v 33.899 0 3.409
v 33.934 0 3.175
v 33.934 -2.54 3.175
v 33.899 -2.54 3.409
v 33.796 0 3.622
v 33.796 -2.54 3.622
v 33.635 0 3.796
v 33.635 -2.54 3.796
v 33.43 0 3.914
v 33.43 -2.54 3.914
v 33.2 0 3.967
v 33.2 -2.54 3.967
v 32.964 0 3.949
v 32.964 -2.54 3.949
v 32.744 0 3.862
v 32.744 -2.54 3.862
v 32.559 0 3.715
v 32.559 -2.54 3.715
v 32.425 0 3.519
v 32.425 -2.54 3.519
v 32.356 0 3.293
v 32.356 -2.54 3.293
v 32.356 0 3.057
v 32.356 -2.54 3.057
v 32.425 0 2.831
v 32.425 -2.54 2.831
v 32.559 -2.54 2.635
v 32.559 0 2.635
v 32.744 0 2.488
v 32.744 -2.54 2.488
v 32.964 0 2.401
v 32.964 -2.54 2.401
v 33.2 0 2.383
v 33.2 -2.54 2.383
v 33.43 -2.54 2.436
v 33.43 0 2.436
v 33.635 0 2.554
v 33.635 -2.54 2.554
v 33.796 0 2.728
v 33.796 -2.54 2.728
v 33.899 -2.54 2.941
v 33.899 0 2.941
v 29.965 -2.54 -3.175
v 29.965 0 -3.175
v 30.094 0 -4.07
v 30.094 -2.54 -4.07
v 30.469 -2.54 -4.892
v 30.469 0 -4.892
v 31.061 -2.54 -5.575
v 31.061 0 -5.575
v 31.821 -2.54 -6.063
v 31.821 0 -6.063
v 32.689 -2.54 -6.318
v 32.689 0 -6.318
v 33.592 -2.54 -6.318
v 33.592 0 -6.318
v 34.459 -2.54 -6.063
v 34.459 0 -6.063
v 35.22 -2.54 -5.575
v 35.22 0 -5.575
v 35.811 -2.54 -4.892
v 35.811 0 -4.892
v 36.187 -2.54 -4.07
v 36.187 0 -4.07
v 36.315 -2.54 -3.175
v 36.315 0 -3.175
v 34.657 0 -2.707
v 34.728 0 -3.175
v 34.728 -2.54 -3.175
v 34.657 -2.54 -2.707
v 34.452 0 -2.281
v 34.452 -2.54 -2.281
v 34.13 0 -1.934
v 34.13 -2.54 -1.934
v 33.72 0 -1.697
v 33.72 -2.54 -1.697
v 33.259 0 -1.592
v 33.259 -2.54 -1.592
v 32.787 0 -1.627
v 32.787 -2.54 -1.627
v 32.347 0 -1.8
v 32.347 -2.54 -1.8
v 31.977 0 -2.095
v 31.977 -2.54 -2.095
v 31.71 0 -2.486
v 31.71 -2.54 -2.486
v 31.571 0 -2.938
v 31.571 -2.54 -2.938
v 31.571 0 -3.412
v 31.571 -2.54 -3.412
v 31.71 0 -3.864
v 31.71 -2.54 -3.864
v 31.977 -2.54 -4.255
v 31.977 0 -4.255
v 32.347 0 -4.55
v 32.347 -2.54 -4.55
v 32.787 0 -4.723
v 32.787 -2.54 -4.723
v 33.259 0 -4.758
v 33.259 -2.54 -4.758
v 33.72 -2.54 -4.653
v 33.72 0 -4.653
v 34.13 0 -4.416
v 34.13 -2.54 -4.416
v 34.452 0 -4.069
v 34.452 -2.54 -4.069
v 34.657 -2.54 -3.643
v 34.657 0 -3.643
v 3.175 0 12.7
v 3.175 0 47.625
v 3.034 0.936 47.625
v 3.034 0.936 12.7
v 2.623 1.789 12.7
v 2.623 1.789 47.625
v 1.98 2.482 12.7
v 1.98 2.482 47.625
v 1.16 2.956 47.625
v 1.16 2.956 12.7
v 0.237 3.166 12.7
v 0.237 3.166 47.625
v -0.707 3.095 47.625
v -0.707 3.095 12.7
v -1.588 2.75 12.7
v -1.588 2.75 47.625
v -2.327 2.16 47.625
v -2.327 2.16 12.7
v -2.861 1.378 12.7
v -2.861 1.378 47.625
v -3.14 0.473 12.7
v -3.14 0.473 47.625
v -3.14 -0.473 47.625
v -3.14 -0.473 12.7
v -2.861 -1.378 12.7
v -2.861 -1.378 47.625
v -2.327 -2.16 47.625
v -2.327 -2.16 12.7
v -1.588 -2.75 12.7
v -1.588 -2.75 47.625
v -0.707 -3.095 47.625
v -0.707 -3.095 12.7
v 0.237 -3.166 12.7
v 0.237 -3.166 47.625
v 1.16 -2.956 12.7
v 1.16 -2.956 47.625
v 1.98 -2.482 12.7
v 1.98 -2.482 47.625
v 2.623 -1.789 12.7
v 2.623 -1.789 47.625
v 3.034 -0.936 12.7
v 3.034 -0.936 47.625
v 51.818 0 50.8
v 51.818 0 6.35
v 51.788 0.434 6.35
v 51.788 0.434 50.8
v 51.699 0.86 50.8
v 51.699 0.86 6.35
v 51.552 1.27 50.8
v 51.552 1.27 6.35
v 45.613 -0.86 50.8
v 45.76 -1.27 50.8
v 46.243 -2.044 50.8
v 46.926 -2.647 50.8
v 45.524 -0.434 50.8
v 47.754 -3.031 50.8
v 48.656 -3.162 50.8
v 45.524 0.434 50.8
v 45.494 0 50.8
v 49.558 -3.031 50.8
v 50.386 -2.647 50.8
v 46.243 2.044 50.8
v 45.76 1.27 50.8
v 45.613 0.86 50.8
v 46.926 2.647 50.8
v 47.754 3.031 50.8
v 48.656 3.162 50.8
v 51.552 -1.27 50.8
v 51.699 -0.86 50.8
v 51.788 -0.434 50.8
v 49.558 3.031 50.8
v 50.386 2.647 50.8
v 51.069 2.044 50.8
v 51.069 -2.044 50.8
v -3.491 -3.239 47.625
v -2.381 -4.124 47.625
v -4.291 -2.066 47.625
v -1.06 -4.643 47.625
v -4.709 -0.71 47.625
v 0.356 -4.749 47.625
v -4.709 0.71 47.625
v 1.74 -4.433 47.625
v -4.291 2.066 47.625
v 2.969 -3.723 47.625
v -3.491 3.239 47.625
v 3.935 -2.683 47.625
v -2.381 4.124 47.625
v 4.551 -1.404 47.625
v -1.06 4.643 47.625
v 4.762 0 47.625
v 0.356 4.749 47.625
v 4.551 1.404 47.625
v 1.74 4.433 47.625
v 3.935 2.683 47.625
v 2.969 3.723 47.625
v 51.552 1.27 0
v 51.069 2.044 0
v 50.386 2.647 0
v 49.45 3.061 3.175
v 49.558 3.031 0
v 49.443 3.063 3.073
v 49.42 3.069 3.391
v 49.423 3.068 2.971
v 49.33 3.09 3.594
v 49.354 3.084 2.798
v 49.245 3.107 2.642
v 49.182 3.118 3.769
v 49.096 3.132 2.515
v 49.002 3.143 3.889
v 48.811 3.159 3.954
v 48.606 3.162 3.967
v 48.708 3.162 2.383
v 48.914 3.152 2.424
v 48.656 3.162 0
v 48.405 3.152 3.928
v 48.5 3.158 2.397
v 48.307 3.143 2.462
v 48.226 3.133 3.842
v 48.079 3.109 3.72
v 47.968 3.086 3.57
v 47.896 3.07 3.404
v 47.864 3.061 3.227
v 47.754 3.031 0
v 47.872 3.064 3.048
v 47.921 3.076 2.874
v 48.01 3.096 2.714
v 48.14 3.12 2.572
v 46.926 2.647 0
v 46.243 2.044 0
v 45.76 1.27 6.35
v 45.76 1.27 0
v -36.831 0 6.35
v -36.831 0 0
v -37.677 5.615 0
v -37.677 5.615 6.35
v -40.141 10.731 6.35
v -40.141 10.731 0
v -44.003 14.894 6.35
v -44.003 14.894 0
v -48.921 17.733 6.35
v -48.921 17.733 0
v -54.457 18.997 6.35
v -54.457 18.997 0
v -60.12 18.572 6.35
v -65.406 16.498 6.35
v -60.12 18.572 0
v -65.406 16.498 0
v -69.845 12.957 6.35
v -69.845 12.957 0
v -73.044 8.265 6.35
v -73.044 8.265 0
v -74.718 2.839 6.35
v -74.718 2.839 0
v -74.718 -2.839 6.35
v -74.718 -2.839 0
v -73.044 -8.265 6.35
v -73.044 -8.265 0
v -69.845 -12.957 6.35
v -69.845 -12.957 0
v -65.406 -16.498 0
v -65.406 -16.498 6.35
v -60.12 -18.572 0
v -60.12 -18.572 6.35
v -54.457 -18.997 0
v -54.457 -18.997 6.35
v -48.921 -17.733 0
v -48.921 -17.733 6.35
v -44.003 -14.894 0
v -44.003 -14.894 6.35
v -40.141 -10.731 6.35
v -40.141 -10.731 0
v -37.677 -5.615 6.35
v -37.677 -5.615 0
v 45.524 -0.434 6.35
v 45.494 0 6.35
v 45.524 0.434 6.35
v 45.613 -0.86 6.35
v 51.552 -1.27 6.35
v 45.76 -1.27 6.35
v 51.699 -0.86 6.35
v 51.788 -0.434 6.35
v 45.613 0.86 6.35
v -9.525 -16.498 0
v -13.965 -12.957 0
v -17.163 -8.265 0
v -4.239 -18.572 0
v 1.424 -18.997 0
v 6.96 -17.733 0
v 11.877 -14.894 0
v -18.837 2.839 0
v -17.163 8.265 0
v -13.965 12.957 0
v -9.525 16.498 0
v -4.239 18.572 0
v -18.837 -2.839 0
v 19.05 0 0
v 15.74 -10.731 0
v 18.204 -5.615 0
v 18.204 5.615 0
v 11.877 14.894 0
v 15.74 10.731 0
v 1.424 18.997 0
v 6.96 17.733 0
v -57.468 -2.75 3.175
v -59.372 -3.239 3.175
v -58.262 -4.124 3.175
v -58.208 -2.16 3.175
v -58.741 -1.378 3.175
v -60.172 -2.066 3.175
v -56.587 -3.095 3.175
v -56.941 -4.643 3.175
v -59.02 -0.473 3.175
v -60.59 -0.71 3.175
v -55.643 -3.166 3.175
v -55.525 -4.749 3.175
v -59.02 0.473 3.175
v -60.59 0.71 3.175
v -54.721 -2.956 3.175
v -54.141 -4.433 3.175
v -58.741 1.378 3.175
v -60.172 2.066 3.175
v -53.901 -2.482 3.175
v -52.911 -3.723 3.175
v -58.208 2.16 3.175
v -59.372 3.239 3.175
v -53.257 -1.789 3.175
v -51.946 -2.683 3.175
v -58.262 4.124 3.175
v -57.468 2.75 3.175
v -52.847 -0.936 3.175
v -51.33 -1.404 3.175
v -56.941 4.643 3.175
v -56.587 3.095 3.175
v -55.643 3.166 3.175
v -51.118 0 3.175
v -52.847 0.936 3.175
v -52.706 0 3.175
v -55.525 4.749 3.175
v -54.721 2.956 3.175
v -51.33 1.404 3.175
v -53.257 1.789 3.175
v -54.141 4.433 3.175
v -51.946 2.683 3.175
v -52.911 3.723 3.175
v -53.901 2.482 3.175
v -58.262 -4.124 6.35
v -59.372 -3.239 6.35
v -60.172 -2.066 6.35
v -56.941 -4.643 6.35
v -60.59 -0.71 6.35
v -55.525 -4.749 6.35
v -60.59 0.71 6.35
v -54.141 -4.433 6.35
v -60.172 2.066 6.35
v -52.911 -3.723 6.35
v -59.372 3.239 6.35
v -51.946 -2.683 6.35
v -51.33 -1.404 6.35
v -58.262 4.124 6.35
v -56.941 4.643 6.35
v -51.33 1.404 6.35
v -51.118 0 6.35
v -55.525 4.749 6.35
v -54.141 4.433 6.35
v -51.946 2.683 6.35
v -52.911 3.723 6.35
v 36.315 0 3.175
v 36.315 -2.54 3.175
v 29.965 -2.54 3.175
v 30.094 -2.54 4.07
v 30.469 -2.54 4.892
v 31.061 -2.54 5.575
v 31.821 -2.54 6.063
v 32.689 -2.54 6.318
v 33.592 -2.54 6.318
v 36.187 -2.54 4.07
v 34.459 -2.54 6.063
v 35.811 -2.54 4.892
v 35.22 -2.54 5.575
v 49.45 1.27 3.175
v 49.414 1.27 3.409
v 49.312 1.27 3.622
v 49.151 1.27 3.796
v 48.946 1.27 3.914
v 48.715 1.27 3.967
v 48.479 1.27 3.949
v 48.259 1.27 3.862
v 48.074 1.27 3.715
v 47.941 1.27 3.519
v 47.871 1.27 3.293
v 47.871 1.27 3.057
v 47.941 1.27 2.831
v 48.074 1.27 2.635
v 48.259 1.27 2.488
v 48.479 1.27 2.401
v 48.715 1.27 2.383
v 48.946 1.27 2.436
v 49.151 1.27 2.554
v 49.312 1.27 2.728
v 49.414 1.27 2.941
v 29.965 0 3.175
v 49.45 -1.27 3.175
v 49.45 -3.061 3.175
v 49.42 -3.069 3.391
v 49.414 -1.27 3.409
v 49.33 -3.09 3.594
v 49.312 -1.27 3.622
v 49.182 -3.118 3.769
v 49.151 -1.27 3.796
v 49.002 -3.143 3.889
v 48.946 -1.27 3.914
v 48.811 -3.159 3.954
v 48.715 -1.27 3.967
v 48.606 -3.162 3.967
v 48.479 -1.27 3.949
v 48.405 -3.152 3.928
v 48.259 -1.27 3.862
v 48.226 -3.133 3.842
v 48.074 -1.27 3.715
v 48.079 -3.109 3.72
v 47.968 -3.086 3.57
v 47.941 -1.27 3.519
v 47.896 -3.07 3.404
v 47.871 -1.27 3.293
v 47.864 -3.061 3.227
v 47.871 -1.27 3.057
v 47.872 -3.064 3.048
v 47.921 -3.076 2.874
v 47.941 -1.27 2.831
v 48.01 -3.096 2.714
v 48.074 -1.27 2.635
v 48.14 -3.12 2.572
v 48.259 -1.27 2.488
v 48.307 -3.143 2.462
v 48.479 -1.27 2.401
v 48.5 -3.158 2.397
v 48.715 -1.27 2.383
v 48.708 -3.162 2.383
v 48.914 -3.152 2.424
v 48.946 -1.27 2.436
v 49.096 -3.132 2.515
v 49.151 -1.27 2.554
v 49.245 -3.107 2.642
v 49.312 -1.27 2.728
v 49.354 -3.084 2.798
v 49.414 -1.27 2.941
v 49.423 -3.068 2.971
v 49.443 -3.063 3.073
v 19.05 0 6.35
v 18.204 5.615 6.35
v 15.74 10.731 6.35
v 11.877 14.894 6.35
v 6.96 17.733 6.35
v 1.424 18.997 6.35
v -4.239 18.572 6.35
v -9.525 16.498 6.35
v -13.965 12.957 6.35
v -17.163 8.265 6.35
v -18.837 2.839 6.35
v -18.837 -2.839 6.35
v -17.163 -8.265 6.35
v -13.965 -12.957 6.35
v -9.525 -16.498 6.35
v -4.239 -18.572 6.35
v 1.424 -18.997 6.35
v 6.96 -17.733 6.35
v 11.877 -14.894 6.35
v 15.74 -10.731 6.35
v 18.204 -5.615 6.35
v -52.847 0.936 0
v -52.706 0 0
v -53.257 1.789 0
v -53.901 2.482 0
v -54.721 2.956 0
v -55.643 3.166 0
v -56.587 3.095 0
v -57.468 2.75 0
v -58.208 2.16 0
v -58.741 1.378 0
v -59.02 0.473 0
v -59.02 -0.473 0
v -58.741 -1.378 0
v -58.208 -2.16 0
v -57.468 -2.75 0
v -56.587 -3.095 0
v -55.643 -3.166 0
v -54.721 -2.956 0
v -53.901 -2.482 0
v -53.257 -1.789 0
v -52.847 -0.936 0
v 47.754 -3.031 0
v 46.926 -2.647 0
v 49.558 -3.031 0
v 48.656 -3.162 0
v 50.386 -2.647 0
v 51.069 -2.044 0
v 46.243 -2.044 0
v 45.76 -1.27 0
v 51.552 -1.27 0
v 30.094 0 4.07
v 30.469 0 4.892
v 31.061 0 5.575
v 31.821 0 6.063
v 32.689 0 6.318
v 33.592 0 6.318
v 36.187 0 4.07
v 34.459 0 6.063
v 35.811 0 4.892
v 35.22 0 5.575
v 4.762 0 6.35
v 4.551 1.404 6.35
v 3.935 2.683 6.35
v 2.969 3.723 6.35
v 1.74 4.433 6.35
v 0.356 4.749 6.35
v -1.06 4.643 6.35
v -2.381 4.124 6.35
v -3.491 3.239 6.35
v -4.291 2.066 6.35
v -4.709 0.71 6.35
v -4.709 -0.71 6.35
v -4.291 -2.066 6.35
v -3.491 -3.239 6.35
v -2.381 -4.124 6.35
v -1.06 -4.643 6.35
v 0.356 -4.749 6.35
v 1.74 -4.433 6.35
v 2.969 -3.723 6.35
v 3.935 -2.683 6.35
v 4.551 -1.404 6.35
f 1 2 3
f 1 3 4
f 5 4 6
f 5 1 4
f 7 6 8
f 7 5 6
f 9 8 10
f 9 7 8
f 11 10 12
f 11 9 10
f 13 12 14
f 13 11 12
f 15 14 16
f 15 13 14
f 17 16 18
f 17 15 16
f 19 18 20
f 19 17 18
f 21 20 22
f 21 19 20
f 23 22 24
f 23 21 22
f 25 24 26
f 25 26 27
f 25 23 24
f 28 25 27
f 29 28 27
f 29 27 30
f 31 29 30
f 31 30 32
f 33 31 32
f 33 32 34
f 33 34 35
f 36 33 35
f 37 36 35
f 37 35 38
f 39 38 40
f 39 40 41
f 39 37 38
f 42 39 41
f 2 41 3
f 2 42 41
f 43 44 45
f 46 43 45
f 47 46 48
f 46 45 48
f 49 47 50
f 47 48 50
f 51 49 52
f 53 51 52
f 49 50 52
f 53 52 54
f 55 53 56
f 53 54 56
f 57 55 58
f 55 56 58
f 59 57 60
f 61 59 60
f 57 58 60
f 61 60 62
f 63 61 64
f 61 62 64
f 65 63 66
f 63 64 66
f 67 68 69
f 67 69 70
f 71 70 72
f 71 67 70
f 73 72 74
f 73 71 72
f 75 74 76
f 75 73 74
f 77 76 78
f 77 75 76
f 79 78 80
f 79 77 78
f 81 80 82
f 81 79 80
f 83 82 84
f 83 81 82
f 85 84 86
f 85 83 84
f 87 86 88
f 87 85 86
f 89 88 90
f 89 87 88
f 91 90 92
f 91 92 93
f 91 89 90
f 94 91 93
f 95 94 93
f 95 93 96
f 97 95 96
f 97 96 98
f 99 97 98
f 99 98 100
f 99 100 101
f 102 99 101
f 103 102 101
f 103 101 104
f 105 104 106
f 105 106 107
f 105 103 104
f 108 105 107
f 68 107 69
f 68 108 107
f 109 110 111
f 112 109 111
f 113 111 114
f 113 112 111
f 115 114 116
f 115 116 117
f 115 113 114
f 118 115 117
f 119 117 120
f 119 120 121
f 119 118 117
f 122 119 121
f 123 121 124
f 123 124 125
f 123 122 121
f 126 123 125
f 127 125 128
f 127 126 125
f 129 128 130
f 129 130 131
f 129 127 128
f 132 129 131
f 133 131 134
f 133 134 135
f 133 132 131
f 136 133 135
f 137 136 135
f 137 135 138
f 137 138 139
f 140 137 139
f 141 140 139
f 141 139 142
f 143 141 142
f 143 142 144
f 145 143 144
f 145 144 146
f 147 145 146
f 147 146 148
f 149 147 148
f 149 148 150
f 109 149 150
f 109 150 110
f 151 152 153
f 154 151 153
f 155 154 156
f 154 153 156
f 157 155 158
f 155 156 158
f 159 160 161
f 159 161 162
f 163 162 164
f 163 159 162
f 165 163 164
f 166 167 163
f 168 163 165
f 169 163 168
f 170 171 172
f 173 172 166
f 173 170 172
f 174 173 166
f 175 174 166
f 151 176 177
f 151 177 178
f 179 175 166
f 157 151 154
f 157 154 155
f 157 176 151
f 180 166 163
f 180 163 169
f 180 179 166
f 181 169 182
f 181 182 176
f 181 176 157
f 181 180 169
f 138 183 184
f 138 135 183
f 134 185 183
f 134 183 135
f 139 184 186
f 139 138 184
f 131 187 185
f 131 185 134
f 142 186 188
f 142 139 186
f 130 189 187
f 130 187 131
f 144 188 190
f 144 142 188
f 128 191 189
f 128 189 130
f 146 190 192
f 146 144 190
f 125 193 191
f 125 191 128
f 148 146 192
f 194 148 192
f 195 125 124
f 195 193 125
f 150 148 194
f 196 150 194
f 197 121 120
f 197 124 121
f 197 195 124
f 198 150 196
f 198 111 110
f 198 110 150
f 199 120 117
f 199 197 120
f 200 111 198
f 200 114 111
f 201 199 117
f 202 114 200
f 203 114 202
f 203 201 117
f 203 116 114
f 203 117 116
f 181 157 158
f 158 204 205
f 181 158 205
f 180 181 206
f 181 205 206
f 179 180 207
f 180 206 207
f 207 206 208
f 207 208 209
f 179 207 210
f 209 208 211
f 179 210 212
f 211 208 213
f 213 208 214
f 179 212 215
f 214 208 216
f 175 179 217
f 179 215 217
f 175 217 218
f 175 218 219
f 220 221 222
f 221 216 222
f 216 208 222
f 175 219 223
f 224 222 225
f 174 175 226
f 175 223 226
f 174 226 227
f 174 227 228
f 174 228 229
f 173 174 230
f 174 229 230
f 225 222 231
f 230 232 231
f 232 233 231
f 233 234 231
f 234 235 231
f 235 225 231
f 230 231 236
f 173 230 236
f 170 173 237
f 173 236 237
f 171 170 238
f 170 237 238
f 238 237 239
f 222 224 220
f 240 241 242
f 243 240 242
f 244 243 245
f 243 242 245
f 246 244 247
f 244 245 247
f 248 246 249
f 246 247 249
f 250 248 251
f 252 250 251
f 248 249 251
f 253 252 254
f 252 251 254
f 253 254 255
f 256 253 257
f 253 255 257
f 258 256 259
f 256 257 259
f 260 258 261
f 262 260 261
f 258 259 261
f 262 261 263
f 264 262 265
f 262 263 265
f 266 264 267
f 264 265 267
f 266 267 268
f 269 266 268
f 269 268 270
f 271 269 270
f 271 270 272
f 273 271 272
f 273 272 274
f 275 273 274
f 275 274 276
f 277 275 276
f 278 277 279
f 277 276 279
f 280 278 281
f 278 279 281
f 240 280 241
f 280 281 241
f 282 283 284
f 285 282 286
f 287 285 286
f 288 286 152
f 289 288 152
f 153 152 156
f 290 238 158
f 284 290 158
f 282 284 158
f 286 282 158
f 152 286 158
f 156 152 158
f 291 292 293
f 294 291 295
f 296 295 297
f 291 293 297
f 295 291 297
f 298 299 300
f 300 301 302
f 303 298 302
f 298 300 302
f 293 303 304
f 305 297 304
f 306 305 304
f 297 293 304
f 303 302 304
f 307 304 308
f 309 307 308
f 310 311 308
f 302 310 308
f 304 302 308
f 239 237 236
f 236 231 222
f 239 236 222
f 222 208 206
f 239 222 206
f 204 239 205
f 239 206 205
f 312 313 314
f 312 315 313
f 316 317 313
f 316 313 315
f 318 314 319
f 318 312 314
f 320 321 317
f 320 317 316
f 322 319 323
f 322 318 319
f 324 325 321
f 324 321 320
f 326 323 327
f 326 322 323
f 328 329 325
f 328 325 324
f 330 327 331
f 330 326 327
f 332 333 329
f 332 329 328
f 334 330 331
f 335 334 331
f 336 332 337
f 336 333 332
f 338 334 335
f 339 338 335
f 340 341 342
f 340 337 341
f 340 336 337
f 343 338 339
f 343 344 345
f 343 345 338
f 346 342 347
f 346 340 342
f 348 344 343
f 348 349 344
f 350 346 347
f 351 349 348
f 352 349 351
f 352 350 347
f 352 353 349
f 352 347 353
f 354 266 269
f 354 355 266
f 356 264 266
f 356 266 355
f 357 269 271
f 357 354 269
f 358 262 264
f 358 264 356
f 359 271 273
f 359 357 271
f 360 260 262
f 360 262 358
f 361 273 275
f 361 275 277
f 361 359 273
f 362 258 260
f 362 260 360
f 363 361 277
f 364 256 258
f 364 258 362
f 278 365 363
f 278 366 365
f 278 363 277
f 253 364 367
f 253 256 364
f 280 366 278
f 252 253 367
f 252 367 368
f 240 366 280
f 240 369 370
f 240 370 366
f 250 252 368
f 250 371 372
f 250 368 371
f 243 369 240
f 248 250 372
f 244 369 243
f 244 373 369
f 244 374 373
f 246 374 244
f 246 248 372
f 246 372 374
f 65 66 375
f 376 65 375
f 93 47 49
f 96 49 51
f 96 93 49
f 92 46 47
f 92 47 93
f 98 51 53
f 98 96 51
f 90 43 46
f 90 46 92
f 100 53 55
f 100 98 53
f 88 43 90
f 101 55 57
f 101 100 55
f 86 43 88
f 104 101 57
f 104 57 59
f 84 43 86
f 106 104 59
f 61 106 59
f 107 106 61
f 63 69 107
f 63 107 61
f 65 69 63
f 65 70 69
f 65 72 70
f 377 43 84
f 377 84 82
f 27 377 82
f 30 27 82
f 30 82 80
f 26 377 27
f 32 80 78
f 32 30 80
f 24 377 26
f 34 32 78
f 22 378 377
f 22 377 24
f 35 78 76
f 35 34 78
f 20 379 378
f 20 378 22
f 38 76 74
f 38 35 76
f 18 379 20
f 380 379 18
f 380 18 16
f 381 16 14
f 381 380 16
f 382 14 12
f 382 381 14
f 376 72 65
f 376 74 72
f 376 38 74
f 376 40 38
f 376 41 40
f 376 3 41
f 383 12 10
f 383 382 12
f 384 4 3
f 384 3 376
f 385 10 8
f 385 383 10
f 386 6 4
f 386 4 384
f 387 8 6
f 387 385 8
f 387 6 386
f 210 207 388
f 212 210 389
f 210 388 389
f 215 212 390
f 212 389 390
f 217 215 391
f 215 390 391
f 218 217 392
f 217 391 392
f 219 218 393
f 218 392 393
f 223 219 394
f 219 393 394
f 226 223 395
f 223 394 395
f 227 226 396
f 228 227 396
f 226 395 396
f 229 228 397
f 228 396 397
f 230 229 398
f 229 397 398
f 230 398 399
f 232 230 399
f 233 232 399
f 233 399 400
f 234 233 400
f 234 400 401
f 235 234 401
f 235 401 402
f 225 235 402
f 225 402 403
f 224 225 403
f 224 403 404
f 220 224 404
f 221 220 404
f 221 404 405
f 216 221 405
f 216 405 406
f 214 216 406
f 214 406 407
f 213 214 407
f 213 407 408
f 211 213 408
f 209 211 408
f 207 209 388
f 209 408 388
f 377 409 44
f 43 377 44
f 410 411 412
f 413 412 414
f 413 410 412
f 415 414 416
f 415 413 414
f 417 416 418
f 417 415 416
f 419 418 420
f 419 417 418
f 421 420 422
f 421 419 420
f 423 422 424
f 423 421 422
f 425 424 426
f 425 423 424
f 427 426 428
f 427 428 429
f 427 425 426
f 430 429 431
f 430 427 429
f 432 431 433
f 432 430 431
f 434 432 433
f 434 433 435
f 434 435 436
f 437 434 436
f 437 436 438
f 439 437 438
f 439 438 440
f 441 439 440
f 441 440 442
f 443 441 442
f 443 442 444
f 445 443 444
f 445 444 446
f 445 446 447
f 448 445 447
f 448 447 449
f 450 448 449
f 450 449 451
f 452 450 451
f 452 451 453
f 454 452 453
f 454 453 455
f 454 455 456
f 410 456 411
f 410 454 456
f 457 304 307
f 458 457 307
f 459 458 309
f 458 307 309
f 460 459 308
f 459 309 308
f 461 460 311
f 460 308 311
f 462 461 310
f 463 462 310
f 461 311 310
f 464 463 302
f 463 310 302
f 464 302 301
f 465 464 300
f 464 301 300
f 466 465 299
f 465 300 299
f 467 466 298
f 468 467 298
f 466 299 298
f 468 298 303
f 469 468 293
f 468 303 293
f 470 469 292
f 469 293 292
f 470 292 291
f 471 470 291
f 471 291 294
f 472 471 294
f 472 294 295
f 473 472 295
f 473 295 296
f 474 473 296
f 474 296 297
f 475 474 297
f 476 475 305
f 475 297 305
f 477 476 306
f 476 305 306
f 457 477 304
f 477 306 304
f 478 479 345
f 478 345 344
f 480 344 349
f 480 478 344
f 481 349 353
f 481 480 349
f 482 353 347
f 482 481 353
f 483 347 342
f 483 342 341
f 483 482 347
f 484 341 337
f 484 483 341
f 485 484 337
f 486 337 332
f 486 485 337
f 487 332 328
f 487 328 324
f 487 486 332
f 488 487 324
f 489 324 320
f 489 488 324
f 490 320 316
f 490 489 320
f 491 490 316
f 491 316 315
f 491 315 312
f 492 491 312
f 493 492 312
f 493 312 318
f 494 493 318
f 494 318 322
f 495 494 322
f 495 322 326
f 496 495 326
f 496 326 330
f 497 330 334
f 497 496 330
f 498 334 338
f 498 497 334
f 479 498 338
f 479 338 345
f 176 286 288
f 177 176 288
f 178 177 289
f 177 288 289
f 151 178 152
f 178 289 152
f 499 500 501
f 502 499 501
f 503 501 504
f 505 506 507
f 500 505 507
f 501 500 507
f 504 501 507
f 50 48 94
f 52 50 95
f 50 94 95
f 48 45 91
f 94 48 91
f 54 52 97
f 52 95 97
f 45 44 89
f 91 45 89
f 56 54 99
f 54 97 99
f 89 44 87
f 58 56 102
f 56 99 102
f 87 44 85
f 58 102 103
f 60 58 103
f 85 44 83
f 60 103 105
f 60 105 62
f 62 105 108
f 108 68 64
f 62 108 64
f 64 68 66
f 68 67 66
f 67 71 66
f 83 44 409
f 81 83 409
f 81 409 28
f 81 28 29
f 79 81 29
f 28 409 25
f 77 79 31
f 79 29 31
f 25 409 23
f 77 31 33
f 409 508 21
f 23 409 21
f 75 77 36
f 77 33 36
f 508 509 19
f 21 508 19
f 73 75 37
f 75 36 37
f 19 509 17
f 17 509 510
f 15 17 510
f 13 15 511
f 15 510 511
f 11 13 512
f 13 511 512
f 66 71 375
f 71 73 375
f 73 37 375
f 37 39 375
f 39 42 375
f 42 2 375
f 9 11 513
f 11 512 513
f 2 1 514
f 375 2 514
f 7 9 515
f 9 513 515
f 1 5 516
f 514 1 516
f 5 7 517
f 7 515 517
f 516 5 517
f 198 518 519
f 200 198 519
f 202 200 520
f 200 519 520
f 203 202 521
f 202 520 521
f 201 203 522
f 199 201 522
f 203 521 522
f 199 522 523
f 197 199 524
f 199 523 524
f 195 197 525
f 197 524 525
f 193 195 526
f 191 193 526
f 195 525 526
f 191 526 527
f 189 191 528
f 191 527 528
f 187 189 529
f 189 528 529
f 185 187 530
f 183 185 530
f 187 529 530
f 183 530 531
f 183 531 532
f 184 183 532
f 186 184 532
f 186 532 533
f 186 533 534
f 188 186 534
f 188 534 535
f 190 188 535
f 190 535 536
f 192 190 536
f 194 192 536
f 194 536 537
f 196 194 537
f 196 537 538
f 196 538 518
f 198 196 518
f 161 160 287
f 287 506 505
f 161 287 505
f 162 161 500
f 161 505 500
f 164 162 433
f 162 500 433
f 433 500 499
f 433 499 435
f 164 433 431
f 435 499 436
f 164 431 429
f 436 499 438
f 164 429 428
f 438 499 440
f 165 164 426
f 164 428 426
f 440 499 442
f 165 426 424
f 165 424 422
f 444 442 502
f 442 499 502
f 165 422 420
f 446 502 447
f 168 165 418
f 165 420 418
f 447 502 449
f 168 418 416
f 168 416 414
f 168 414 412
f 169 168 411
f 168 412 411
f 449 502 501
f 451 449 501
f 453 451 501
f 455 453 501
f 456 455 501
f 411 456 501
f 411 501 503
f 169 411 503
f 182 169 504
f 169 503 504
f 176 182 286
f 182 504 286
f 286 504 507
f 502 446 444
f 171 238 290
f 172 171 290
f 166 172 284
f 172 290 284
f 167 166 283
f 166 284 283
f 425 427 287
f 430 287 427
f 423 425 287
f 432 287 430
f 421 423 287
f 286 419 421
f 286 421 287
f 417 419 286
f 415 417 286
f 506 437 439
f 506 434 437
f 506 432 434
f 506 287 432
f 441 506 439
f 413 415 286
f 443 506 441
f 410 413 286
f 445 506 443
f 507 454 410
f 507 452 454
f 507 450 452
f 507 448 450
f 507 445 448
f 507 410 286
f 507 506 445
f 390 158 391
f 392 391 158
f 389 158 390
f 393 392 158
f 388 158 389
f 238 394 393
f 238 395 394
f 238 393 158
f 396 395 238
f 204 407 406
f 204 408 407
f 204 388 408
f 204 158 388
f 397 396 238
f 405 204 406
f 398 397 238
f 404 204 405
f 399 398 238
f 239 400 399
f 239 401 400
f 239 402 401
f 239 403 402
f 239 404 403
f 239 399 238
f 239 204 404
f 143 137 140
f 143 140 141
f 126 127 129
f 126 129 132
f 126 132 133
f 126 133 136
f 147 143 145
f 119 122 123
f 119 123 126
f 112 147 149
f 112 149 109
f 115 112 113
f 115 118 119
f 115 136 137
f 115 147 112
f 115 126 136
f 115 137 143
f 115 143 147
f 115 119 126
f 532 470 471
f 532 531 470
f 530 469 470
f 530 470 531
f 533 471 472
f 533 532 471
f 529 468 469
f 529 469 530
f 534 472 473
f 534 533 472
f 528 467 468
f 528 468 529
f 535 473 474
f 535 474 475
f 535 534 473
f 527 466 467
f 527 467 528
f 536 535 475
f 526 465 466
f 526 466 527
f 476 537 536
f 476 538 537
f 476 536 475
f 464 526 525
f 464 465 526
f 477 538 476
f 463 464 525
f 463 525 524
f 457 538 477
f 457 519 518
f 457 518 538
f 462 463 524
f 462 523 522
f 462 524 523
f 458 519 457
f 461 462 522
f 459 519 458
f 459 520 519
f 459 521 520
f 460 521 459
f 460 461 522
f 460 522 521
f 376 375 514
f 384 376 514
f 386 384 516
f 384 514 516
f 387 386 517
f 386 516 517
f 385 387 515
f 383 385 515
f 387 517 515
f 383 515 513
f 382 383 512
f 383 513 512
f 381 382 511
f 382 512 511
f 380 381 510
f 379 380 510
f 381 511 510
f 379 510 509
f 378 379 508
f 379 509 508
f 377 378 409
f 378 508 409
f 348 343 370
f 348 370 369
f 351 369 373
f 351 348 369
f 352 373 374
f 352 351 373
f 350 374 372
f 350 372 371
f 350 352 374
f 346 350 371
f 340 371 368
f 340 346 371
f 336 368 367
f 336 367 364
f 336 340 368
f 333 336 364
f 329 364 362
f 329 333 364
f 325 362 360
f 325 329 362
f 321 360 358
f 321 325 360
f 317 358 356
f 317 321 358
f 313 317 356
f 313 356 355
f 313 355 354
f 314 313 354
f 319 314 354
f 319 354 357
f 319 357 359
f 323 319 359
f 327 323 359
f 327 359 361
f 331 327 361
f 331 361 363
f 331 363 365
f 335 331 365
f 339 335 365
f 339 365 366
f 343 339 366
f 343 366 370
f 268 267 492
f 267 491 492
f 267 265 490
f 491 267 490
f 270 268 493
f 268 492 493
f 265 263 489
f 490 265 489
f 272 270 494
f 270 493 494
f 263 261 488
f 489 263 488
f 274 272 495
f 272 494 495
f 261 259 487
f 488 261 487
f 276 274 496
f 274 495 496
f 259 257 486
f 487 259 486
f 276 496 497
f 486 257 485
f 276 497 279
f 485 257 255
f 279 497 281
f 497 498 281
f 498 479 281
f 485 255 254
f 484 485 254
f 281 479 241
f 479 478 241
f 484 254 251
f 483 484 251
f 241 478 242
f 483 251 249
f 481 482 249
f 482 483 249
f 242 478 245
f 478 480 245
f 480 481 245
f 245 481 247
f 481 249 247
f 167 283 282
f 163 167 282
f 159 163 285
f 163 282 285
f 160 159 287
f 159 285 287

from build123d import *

# Parameters (mm, degrees)
F0_R           = 19.05
F0_R_2         = 4.7625
F1_DEPTH       = 6.35
F0_R_3         = 3.175
F2_DEPTH       = 12.7
F3_DEPTH       = 47.625
F4_R           = 19.05
F4_R_2         = 4.7625
F5_DEPTH       = 6.35
F4_R_3         = 3.175
F6_DEPTH       = 3.175
F8_DEPTH       = 50.8
F9_DEPTH       = 6.35
F10_R          = 0.79375
F11_DEPTH      = 3.175
F11_DEPTH_BACK = 3.175
F12_R          = 0.79375
F12_R_2        = 1.5875
F13_DEPTH      = 2.54


with BuildPart() as f1:
    # F0 (on Top) → F1 (new body)
    with BuildSketch(Plane.XY):
        Circle(F0_R)
        Circle(F0_R_2, mode=Mode.SUBTRACT)
    extrude(amount=F1_DEPTH)



with BuildPart() as f2:
    # F0 (on Top) → F2 (new body)
    with BuildSketch(Plane.XY):
        Circle(F0_R_3)
    extrude(amount=F2_DEPTH)


with BuildPart() as f1_1:
    add(f1.part)

    add(f2.part)  # F3 merges F2
    # F0 (on Top) → F3 (join)
    with BuildSketch(Plane.XY):
        Circle(F0_R_2)
        Circle(F0_R_3, mode=Mode.SUBTRACT)
    extrude(amount=F3_DEPTH)


with BuildPart() as f5:
    # F4 (on Top) → F5 (new body)
    with BuildSketch(Plane.XY):
        with Locations((-55.8807500322, 0)):
            Circle(F4_R)
        with Locations((-55.8807500322, 0)):
            Circle(F4_R_2, mode=Mode.SUBTRACT)
    extrude(amount=F5_DEPTH)

    # F4 (on Top) → F6 (join)
    with BuildSketch(Plane.XY):
        with Locations((-55.8807500322, 0)):
            Circle(F4_R_2)
        with Locations((-55.8807500322, 0)):
            Circle(F4_R_3, mode=Mode.SUBTRACT)
    extrude(amount=F6_DEPTH)


with BuildPart() as f8:
    # F7 (on Top) → F8 (new body)
    with BuildSketch(Plane.XY):
        with BuildLine():
            Line((48.6559979618, 0), (51.8182979618, 0))
            ThreePointArc((51.8182979618, 0), (51.7510257715, 0.6488020863), (51.552071388, 1.27))
            Line((51.552071388, 1.27), (48.6559979618, 1.27))
            Line((48.6559979618, 1.27), (48.6559979618, 0))
        make_face()
        with BuildLine():
            ThreePointArc((51.552071388, -1.27), (51.7510257715, -0.6488020863), (51.8182979618, 0))
            Line((51.8182979618, 0), (48.6559979618, 0))
            Line((48.6559979618, 0), (48.6559979618, -1.27))
            Line((48.6559979618, -1.27), (51.552071388, -1.27))
        make_face()
        with BuildLine():
            Line((48.6559979618, 1.27), (51.552071388, 1.27))
            ThreePointArc((51.552071388, 1.27), (48.6559979618, 3.1623), (45.7599245355, 1.27))
            Line((45.7599245355, 1.27), (48.6559979618, 1.27))
        make_face()
        with BuildLine():
            ThreePointArc((45.7599245355, -1.27), (48.6559979618, -3.1623), (51.552071388, -1.27))
            Line((51.552071388, -1.27), (48.6559979618, -1.27))
            Line((48.6559979618, -1.27), (45.7599245355, -1.27))
        make_face()
        with BuildLine():
            Line((48.6559979618, -1.27), (48.6559979618, 0))
            Line((48.6559979618, 0), (45.4936979618, 0))
            ThreePointArc((45.4936979618, 0), (45.5609701521, -0.6488020863), (45.7599245355, -1.27))
            Line((45.7599245355, -1.27), (48.6559979618, -1.27))
        make_face()
        with BuildLine():
            Line((45.4936979618, 0), (48.6559979618, 0))
            Line((48.6559979618, 0), (48.6559979618, 1.27))
            Line((48.6559979618, 1.27), (45.7599245355, 1.27))
            ThreePointArc((45.7599245355, 1.27), (45.5609701521, 0.6488020863), (45.4936979618, 0))
        make_face()
    extrude(amount=F8_DEPTH)

    # F7 (on Top) → F9 (cut)
    with BuildSketch(Plane.XY):
        with BuildLine():
            Line((45.4936979618, 0), (48.6559979618, 0))
            Line((48.6559979618, 0), (48.6559979618, 1.27))
            Line((48.6559979618, 1.27), (45.7599245355, 1.27))
            ThreePointArc((45.7599245355, 1.27), (45.5609701521, 0.6488020863), (45.4936979618, 0))
        make_face()
        with BuildLine():
            Line((48.6559979618, 0), (51.8182979618, 0))
            ThreePointArc((51.8182979618, 0), (51.7510257715, 0.6488020863), (51.552071388, 1.27))
            Line((51.552071388, 1.27), (48.6559979618, 1.27))
            Line((48.6559979618, 1.27), (48.6559979618, 0))
        make_face()
        with BuildLine():
            Line((48.6559979618, -1.27), (48.6559979618, 0))
            Line((48.6559979618, 0), (45.4936979618, 0))
            ThreePointArc((45.4936979618, 0), (45.5609701521, -0.6488020863), (45.7599245355, -1.27))
            Line((45.7599245355, -1.27), (48.6559979618, -1.27))
        make_face()
        with BuildLine():
            ThreePointArc((51.552071388, -1.27), (51.7510257715, -0.6488020863), (51.8182979618, 0))
            Line((51.8182979618, 0), (48.6559979618, 0))
            Line((48.6559979618, 0), (48.6559979618, -1.27))
            Line((48.6559979618, -1.27), (51.552071388, -1.27))
        make_face()
    extrude(amount=F9_DEPTH, mode=Mode.SUBTRACT)

    # F10 (on Front) → F11 (cut, two sides)
    with BuildSketch(Plane.XZ) as f11_sk:
        with Locations((48.6559085548, 3.175)):
            Circle(F10_R)
    extrude(amount=-F11_DEPTH, mode=Mode.SUBTRACT)
    extrude(f11_sk.sketch, amount=F11_DEPTH_BACK, mode=Mode.SUBTRACT)


with BuildPart() as f13:
    # F12 (on Front) → F13 (new body)
    with BuildSketch(Plane.XZ):
        with BuildLine():
            ThreePointArc((33.1403914758, 0), (35.3854555061, 0.9299359697), (36.3153914758, 3.175))
            ThreePointArc((36.3153914758, 3.175), (33.1403914758, 6.35), (29.9653914758, 3.175))
            ThreePointArc((29.9653914758, 3.175), (30.8953274456, 0.9299359697), (33.1403914758, 0))
        make_face()
        with Locations((33.1403914758, 3.175)):
            Circle(F12_R, mode=Mode.SUBTRACT)
        with BuildLine():
            Line((36.3153914758, -3.175), (36.3153914758, 3.175))
            ThreePointArc((36.3153914758, 3.175), (35.3854555061, 0.9299359697), (33.1403914758, 0))
            ThreePointArc((33.1403914758, 0), (35.3854555061, -0.9299359697), (36.3153914758, -3.175))
        make_face()
        with BuildLine():
            ThreePointArc((33.1403914758, 0), (30.8953274456, 0.9299359697), (29.9653914758, 3.175))
            Line((29.9653914758, 3.175), (29.9653914758, -3.175))
            ThreePointArc((29.9653914758, -3.175), (30.8953274456, -0.9299359697), (33.1403914758, 0))
        make_face()
        with BuildLine():
            ThreePointArc((36.3153914758, -3.175), (35.3854555061, -0.9299359697), (33.1403914758, 0))
            ThreePointArc((33.1403914758, 0), (30.8953274456, -0.9299359697), (29.9653914758, -3.175))
            ThreePointArc((29.9653914758, -3.175), (33.1403914758, -6.35), (36.3153914758, -3.175))
        make_face()
        with Locations((33.1403914758, -3.175)):
            Circle(F12_R_2, mode=Mode.SUBTRACT)
    extrude(amount=F13_DEPTH)


solid = Compound([f1_1.part, f5.part, f8.part, f13.part])
